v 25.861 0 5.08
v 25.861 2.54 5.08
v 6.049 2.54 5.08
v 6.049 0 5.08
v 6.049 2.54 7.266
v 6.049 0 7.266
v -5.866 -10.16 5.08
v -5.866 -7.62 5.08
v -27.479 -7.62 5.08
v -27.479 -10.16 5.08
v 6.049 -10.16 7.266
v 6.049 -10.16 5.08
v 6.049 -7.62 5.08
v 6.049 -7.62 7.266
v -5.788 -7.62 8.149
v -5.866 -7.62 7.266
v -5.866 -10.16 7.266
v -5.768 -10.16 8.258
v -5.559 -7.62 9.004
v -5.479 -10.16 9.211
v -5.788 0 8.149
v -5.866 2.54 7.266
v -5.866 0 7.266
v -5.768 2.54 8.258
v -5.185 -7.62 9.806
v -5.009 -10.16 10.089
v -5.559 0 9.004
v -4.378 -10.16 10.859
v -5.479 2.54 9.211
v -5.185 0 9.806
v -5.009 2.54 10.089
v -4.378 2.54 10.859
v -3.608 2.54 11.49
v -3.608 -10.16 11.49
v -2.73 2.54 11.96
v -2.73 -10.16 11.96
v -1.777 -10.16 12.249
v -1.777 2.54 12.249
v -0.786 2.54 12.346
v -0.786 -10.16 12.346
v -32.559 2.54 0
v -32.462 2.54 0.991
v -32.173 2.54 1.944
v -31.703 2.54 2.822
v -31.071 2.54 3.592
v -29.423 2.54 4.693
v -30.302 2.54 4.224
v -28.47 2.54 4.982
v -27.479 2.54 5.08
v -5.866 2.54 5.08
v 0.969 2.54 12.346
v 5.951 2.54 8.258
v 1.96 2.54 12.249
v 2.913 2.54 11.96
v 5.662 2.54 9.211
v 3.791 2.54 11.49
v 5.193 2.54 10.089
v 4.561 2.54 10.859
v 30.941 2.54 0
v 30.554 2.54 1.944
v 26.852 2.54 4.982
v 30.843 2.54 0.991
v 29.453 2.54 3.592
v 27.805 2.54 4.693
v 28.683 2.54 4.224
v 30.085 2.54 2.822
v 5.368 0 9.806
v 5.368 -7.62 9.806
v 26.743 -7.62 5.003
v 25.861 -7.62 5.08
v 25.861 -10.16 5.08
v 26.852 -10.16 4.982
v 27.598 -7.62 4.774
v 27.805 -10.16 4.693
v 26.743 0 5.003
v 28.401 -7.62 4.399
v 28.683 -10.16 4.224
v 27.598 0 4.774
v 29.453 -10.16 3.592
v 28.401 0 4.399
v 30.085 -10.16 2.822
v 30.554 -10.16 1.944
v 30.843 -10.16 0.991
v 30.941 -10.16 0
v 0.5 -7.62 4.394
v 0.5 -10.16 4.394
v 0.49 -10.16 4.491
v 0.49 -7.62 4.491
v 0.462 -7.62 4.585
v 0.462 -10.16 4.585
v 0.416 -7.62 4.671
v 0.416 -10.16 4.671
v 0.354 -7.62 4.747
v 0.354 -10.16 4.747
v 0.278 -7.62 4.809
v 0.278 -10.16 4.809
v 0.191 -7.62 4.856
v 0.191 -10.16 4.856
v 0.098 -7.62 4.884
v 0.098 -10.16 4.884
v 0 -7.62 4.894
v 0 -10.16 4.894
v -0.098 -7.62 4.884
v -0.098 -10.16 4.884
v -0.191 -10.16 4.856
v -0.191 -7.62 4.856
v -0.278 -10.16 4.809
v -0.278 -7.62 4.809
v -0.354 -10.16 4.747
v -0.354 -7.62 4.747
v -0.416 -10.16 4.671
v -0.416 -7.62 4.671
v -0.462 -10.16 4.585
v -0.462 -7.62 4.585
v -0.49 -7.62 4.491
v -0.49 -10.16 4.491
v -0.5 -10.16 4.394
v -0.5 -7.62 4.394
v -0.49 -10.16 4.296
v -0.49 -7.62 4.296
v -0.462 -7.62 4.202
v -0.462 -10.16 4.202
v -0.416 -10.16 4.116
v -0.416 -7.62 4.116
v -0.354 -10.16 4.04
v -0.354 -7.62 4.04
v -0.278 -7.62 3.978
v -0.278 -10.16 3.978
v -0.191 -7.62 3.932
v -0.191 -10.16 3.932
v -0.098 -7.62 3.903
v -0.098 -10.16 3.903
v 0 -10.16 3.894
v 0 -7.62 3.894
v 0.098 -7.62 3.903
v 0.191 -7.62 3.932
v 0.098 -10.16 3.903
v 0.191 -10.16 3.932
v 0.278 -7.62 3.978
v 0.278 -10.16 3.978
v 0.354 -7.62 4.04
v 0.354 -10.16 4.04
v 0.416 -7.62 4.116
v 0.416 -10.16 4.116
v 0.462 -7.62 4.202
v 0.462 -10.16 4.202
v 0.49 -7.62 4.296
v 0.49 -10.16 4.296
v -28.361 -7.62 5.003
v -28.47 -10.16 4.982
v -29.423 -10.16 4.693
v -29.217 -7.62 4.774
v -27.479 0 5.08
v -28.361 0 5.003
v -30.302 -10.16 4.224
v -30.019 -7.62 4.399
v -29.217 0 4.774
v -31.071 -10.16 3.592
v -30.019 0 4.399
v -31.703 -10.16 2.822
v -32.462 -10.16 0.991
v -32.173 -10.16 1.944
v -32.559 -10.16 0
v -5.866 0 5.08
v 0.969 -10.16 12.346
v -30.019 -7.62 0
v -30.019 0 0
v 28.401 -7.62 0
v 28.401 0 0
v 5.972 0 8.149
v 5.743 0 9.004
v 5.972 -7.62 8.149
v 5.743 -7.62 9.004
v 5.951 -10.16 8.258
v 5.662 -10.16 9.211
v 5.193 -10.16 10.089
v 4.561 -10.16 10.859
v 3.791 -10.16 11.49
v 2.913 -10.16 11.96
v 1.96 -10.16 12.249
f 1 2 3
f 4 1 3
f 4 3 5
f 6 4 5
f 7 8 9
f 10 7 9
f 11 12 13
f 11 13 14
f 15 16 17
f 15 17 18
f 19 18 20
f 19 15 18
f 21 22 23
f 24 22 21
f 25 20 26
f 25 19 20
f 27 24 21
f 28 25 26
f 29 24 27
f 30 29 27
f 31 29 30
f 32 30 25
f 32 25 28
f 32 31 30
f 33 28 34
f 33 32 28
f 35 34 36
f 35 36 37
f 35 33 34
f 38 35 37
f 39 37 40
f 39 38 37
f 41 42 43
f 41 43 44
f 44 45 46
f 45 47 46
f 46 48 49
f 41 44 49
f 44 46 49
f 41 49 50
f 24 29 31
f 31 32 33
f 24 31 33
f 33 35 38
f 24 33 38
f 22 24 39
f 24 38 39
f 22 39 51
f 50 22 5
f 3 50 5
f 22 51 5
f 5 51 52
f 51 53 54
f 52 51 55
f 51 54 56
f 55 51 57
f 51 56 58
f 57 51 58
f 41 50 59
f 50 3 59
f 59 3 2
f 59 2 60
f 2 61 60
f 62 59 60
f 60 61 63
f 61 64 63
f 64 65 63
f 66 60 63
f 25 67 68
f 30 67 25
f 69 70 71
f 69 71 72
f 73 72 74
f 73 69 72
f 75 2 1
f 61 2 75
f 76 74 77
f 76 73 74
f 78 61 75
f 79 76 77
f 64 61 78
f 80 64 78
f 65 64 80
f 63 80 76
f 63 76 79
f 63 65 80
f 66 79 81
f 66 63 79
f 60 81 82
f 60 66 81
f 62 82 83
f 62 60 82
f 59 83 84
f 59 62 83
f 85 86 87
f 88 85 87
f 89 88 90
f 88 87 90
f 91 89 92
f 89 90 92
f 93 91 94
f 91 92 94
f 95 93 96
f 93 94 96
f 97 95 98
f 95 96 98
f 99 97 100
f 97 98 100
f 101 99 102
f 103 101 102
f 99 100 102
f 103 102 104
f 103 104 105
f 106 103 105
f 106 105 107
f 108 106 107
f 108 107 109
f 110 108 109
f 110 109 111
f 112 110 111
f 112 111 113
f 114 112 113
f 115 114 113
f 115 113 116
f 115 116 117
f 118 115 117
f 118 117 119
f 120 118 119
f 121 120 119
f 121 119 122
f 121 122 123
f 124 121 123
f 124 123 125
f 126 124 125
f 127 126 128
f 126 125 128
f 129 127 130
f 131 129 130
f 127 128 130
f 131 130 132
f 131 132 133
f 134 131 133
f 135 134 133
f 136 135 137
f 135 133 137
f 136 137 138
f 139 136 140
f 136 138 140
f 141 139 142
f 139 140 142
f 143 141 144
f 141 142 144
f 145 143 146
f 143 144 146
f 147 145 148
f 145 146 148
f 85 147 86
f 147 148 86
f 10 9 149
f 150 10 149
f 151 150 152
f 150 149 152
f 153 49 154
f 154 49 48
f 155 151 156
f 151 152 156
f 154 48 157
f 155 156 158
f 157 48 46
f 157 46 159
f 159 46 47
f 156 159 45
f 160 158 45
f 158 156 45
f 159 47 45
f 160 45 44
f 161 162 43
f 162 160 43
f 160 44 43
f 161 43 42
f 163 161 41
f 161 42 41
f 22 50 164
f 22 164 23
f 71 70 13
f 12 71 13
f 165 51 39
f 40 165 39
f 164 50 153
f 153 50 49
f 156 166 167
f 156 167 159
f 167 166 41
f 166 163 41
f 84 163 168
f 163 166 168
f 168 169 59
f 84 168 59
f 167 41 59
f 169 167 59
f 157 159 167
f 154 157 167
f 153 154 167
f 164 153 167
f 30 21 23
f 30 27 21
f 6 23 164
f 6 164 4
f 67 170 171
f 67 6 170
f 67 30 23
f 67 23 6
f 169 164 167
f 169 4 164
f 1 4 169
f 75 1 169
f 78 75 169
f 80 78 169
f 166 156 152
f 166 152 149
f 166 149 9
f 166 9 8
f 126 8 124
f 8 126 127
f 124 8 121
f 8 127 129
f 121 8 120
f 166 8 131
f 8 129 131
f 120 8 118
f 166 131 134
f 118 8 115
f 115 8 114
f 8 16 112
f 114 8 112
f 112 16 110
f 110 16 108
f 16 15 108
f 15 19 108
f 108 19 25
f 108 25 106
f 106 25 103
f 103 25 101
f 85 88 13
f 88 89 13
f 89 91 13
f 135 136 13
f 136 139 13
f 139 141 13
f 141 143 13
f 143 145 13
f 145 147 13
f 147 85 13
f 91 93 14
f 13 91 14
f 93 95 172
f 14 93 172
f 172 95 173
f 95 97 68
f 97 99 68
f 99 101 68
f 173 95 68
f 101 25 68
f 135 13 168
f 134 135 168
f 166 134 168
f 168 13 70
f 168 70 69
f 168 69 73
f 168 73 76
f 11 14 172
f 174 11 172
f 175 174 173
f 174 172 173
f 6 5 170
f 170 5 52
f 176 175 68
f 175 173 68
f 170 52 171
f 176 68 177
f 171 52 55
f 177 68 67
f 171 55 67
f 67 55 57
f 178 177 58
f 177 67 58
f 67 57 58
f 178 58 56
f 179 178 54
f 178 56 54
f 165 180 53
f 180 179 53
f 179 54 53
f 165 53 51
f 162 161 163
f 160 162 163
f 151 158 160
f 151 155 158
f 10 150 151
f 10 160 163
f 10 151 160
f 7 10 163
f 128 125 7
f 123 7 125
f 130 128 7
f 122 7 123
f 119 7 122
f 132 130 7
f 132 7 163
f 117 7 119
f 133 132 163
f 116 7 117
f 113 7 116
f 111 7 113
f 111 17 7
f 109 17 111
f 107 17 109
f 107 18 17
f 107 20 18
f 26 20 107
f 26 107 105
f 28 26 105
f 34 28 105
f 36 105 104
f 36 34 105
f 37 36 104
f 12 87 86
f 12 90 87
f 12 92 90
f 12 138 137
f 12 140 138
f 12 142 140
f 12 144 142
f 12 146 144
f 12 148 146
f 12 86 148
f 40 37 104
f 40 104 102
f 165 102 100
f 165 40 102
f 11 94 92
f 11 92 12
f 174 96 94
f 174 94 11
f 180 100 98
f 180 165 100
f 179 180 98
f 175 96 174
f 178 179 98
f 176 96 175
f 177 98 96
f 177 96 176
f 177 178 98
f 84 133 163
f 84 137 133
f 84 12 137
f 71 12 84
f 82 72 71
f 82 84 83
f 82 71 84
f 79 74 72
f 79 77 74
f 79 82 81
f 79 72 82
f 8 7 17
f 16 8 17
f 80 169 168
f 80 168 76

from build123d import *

# Parameters (mm, degrees)
F0_W        = 22.3517898379
F0_H        = 5.08
F0_W_2      = 24.1537776476
F0_W_3      = 6.0488656163
F0_H_2      = 4.7264951599
F0_W_4      = 5.8655668981
F1_DEPTH    = 7.62
F2_T        = 2.54
F3_R        = 0.5
F4_DEPTH    = 8.10174
F6_T1_DEPTH = 38.1
F6_T3_DEPTH = 38.1
F6_T5_DEPTH = 38.1
F6_T7_DEPTH = 38.1
F7_DEPTH    = 7.36236


# Not quite as in the source:
# - a fillet or chamfer that OpenCascade refuses, or shapes differently, is made with other operations: its cross-section is extruded or revolved along the edge and cut away or added
# - a feature of the source that left no trace in its solid (it failed there, or was rolled back) is left out


with BuildPart() as f1:
    # F0 (on Front) → F1 (new body)
    with BuildSketch(Plane.XZ):
        Polygon((-5.8655668981, 0), (0, 0), (6.0488656163, 0), (6.0488656163, 5.08), (0, 5.08), (-5.8655668981, 5.08), align=None)
        with Locations((17.2247605353, 2.54)):
            Rectangle(F0_W, F0_H)
        with Locations((-17.942455722, 2.54)):
            Rectangle(F0_W_2, F0_H)
        with Locations((3.0244328082, 7.4432475799)):
            Rectangle(F0_W_3, F0_H_2)
        with Locations((-2.9327834491, 7.4432475799)):
            Rectangle(F0_W_4, F0_H_2)
    extrude(amount=F1_DEPTH)

    # F2
    f2_openings = [f1.faces().sort_by_distance(p)[0] for p in [
        (-17.942456, -3.81, 5.08),
        (-0.809345, -3.81, 0),
        (17.224761, -3.81, 5.08),
        (6.048866, -3.81, 7.443248),
        (-5.865567, -3.81, 7.443248),
    ]]
    offset(amount=F2_T, openings=f2_openings, kind=Kind.INTERSECTION)

    # F3 (on face) → F4 (cut)
    with BuildSketch(Plane.XZ.offset(10.16)):
        with Locations((0, 4.3936586007)):
            Circle(F3_R)
    extrude(amount=-F4_DEPTH, mode=Mode.SUBTRACT)

    # F6: fillet of radius 5.08 on 6 edges, made by hand

    # F6_s2 → F6_t1 (cut)
    with BuildSketch(Plane.XZ.offset(-15.24)):
        with BuildLine():
            ThreePointArc((25.8606554542, 5.08), (29.4527579027, 3.5921024484), (30.9406554542, 0))
            Line((30.9406554542, 0), (31.0422554542, 0))
            Line((31.0422554542, 0), (31.0422554542, 5.1816))
            Line((31.0422554542, 5.1816), (25.8606554542, 5.1816))
            Line((25.8606554542, 5.1816), (25.8606554542, 5.08))
        make_face()
    extrude(amount=F6_T1_DEPTH, mode=Mode.SUBTRACT)

    # F6_s4 → F6_t3 (cut)
    with BuildSketch(Plane.XZ.offset(-15.24)):
        with BuildLine():
            ThreePointArc((-27.4793445458, 5.08), (-31.0714469942, 3.5921024484), (-32.5593445458, 0))
            Line((-32.5593445458, 0), (-32.6609445458, 0))
            Line((-32.6609445458, 0), (-32.6609445458, 5.1816))
            Line((-32.6609445458, 5.1816), (-27.4793445458, 5.1816))
            Line((-27.4793445458, 5.1816), (-27.4793445458, 5.08))
        make_face()
    extrude(amount=F6_T3_DEPTH, mode=Mode.SUBTRACT)

    # F6_s6 → F6_t5 (cut)
    with BuildSketch(Plane.XZ.offset(-15.24)):
        with BuildLine():
            ThreePointArc((6.0488656163, 7.2664951599), (4.5609680647, 10.8585976083), (0.9688656163, 12.3464951599))
            Line((0.9688656163, 12.3464951599), (0.9688656163, 12.4480951599))
            Line((0.9688656163, 12.4480951599), (6.1504656163, 12.4480951599))
            Line((6.1504656163, 12.4480951599), (6.1504656163, 7.2664951599))
            Line((6.1504656163, 7.2664951599), (6.0488656163, 7.2664951599))
        make_face()
    extrude(amount=F6_T5_DEPTH, mode=Mode.SUBTRACT)

    # F6_s8 → F6_t7 (cut)
    with BuildSketch(Plane.XZ.offset(-15.24)):
        with BuildLine():
            ThreePointArc((-5.8655668981, 7.2664951599), (-4.3776693466, 10.8585976083), (-0.7855668981, 12.3464951599))
            Line((-0.7855668981, 12.3464951599), (-0.7855668981, 12.4480951599))
            Line((-0.7855668981, 12.4480951599), (-5.9671668981, 12.4480951599))
            Line((-5.9671668981, 12.4480951599), (-5.9671668981, 7.2664951599))
            Line((-5.9671668981, 7.2664951599), (-5.8655668981, 7.2664951599))
        make_face()
    extrude(amount=F6_T7_DEPTH, mode=Mode.SUBTRACT)

    # F3 (on face) → F7 (cut)
    with BuildSketch(Plane.XZ.offset(10.16)):
        with Locations((0, 4.3936586007)):
            Circle(F3_R)
    extrude(amount=-F7_DEPTH, mode=Mode.SUBTRACT)


solid = f1.part
